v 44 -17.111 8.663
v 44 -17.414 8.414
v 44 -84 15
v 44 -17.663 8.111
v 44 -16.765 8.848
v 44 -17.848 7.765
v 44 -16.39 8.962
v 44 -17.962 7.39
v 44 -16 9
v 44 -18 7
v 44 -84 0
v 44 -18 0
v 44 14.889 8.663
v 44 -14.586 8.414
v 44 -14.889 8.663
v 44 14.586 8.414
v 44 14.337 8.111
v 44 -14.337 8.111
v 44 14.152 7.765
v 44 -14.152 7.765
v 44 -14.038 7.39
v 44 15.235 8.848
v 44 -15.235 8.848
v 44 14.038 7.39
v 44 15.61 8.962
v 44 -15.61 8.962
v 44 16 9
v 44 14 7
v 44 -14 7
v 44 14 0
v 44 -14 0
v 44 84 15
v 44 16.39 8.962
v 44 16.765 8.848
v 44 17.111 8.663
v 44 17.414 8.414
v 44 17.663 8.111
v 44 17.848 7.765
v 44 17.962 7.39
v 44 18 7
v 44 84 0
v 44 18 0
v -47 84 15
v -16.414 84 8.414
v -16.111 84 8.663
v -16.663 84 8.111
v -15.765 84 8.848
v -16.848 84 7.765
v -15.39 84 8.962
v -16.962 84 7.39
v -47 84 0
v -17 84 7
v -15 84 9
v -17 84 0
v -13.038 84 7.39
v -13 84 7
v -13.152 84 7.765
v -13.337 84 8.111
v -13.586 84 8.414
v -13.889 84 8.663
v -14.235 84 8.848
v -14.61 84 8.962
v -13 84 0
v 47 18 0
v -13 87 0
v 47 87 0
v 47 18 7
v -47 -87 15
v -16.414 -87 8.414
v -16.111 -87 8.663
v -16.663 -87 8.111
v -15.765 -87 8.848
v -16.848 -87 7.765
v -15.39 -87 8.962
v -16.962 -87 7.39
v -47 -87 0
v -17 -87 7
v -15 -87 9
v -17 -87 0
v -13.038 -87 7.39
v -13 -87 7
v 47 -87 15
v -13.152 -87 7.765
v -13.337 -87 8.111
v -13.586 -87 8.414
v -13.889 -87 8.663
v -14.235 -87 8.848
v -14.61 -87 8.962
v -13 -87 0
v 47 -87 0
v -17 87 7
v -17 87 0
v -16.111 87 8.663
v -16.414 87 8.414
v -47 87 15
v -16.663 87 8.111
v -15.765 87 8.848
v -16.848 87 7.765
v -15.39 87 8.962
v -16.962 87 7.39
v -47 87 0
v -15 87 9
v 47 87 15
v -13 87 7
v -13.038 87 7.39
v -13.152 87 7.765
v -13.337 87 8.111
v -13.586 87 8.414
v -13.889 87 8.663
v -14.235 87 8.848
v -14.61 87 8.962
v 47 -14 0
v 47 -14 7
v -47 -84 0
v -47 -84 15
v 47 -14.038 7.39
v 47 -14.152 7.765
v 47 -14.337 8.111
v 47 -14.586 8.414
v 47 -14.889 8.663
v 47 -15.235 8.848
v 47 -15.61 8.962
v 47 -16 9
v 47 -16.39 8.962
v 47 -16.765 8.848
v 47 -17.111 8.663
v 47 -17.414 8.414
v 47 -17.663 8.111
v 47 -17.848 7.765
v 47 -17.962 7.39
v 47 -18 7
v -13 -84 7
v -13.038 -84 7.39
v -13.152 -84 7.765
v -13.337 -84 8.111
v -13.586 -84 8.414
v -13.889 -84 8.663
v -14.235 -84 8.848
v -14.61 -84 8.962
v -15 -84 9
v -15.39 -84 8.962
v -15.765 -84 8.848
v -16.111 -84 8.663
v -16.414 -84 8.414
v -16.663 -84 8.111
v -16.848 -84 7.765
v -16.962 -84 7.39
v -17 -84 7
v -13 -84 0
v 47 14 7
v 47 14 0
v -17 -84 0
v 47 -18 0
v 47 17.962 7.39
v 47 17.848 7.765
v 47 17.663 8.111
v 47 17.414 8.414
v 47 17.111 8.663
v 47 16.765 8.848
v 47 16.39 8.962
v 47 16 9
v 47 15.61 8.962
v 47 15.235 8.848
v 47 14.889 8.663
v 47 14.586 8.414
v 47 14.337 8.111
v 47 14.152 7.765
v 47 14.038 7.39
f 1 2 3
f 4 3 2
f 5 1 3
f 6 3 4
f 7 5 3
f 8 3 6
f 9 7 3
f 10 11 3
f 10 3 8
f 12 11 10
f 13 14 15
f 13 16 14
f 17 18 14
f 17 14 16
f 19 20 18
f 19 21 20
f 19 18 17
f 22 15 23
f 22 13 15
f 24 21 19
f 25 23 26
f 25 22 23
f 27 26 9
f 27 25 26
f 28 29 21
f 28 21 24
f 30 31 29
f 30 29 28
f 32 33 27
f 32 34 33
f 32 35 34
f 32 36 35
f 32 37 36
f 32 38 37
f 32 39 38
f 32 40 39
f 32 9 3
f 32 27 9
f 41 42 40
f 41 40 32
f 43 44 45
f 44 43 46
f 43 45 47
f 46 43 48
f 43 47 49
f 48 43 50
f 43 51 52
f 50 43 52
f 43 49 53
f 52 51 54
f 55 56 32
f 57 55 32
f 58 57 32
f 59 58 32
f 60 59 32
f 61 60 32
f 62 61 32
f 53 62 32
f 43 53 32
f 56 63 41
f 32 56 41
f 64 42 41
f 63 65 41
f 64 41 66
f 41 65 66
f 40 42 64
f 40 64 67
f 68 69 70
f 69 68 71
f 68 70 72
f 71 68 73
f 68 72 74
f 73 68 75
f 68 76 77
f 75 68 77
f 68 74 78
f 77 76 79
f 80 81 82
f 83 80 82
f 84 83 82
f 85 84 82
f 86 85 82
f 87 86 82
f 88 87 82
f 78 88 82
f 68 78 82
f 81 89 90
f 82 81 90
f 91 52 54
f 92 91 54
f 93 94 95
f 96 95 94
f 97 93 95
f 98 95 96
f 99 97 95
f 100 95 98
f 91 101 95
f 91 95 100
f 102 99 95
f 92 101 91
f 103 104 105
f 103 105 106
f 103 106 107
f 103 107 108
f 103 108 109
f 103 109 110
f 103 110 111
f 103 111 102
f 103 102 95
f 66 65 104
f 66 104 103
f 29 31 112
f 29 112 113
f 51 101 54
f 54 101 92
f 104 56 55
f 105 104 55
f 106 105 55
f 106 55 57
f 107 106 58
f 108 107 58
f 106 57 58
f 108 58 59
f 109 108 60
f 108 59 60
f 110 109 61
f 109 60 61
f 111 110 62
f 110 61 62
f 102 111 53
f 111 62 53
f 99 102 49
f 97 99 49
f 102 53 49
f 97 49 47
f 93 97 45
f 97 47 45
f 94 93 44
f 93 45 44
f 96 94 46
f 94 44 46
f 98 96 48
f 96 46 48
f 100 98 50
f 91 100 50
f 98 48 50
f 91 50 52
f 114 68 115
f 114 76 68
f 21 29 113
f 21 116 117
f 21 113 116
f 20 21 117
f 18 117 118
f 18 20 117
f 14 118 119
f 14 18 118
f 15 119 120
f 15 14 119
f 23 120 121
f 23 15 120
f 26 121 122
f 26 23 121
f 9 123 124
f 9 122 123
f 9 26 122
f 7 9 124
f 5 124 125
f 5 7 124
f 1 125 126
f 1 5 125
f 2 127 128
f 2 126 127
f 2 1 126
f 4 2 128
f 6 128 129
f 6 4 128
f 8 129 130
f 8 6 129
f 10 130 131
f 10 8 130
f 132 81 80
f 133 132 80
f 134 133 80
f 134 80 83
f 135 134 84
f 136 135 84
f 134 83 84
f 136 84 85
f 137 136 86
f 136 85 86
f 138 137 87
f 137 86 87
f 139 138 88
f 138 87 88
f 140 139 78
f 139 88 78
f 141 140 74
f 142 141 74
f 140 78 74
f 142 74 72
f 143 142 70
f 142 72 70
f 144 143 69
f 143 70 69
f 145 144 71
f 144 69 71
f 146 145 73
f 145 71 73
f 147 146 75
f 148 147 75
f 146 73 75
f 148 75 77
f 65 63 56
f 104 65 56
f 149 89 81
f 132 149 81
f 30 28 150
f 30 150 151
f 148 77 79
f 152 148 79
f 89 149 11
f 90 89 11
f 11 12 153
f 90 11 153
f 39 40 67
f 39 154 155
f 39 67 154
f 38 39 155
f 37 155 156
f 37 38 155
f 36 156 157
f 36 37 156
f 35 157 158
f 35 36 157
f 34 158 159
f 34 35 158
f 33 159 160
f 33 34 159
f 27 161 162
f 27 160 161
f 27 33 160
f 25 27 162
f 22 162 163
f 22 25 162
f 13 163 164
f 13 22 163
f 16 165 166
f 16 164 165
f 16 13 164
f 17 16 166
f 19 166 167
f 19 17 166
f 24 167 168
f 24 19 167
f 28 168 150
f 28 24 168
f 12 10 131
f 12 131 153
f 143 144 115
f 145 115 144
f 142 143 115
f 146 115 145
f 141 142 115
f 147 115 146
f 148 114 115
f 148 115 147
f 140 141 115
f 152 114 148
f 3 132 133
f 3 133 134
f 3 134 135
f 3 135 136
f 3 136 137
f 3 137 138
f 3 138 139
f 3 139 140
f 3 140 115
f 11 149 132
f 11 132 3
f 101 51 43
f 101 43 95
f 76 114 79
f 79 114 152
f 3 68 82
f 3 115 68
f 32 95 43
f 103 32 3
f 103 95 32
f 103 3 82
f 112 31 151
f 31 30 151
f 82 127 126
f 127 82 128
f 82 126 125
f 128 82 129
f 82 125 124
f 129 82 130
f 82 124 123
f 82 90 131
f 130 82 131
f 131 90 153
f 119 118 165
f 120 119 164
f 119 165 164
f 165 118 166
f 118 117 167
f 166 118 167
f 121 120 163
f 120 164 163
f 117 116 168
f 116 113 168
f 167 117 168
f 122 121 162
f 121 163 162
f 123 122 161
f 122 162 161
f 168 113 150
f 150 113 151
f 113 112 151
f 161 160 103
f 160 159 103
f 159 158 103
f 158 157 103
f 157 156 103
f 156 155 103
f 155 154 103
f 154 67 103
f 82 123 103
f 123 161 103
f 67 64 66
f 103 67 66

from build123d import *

# Parameters (mm, degrees)
F0_W     = 94
F0_H     = 174
F1_DEPTH = 15
F2_T     = -3
F4_DEPTH = 100
F6_DEPTH = 125


with BuildPart() as f1:
    # F0 (on Top) → F1 (new body)
    with BuildSketch(Plane.XY):
        Rectangle(F0_W, F0_H)
    extrude(amount=F1_DEPTH)

    # F2
    f2_openings = [f1.faces().sort_by_distance(p)[0] for p in [
        (0, 0, 15),
        (-47, 0, 7.5),
        (0, 0, 0),
    ]]
    offset(amount=F2_T, openings=f2_openings)

    # F3 (on Right) → F4 (cut)
    with BuildSketch(Plane.YZ):
        with BuildLine():
            Line((-18, 7), (-14, 7))
            ThreePointArc((-14, 7), (-16, 9), (-18, 7))
        make_face()
        with BuildLine():
            Line((-14, 0), (-14, 7))
            ThreePointArc((-14, 7), (-16, 5), (-18, 7))
            Line((-18, 7), (-18, 0))
            Line((-18, 0), (-14, 0))
        make_face()
        with BuildLine():
            ThreePointArc((-18, 7), (-16, 5), (-14, 7))
            Line((-14, 7), (-18, 7))
        make_face()
        with BuildLine():
            Line((14, 7), (18, 7))
            ThreePointArc((18, 7), (16, 9), (14, 7))
        make_face()
        with BuildLine():
            Line((18, 0), (18, 7))
            ThreePointArc((18, 7), (16, 5), (14, 7))
            Line((14, 7), (14, 0))
            Line((14, 0), (18, 0))
        make_face()
        with BuildLine():
            ThreePointArc((14, 7), (16, 5), (18, 7))
            Line((18, 7), (14, 7))
        make_face()
    extrude(amount=F4_DEPTH, mode=Mode.SUBTRACT)

    # F5 (on Front) → F6 (cut, symmetric)
    with BuildSketch(Plane.XZ):
        with BuildLine():
            Line((-17, 7), (-13, 7))
            ThreePointArc((-13, 7), (-15, 9), (-17, 7))
        make_face()
        with BuildLine():
            Line((-13, 0), (-13, 7))
            ThreePointArc((-13, 7), (-15, 5), (-17, 7))
            Line((-17, 7), (-17, 0))
            Line((-17, 0), (-13, 0))
        make_face()
        with BuildLine():
            ThreePointArc((-17, 7), (-15, 5), (-13, 7))
            Line((-13, 7), (-17, 7))
        make_face()
    extrude(amount=F6_DEPTH, both=True, mode=Mode.SUBTRACT)


solid = f1.part
